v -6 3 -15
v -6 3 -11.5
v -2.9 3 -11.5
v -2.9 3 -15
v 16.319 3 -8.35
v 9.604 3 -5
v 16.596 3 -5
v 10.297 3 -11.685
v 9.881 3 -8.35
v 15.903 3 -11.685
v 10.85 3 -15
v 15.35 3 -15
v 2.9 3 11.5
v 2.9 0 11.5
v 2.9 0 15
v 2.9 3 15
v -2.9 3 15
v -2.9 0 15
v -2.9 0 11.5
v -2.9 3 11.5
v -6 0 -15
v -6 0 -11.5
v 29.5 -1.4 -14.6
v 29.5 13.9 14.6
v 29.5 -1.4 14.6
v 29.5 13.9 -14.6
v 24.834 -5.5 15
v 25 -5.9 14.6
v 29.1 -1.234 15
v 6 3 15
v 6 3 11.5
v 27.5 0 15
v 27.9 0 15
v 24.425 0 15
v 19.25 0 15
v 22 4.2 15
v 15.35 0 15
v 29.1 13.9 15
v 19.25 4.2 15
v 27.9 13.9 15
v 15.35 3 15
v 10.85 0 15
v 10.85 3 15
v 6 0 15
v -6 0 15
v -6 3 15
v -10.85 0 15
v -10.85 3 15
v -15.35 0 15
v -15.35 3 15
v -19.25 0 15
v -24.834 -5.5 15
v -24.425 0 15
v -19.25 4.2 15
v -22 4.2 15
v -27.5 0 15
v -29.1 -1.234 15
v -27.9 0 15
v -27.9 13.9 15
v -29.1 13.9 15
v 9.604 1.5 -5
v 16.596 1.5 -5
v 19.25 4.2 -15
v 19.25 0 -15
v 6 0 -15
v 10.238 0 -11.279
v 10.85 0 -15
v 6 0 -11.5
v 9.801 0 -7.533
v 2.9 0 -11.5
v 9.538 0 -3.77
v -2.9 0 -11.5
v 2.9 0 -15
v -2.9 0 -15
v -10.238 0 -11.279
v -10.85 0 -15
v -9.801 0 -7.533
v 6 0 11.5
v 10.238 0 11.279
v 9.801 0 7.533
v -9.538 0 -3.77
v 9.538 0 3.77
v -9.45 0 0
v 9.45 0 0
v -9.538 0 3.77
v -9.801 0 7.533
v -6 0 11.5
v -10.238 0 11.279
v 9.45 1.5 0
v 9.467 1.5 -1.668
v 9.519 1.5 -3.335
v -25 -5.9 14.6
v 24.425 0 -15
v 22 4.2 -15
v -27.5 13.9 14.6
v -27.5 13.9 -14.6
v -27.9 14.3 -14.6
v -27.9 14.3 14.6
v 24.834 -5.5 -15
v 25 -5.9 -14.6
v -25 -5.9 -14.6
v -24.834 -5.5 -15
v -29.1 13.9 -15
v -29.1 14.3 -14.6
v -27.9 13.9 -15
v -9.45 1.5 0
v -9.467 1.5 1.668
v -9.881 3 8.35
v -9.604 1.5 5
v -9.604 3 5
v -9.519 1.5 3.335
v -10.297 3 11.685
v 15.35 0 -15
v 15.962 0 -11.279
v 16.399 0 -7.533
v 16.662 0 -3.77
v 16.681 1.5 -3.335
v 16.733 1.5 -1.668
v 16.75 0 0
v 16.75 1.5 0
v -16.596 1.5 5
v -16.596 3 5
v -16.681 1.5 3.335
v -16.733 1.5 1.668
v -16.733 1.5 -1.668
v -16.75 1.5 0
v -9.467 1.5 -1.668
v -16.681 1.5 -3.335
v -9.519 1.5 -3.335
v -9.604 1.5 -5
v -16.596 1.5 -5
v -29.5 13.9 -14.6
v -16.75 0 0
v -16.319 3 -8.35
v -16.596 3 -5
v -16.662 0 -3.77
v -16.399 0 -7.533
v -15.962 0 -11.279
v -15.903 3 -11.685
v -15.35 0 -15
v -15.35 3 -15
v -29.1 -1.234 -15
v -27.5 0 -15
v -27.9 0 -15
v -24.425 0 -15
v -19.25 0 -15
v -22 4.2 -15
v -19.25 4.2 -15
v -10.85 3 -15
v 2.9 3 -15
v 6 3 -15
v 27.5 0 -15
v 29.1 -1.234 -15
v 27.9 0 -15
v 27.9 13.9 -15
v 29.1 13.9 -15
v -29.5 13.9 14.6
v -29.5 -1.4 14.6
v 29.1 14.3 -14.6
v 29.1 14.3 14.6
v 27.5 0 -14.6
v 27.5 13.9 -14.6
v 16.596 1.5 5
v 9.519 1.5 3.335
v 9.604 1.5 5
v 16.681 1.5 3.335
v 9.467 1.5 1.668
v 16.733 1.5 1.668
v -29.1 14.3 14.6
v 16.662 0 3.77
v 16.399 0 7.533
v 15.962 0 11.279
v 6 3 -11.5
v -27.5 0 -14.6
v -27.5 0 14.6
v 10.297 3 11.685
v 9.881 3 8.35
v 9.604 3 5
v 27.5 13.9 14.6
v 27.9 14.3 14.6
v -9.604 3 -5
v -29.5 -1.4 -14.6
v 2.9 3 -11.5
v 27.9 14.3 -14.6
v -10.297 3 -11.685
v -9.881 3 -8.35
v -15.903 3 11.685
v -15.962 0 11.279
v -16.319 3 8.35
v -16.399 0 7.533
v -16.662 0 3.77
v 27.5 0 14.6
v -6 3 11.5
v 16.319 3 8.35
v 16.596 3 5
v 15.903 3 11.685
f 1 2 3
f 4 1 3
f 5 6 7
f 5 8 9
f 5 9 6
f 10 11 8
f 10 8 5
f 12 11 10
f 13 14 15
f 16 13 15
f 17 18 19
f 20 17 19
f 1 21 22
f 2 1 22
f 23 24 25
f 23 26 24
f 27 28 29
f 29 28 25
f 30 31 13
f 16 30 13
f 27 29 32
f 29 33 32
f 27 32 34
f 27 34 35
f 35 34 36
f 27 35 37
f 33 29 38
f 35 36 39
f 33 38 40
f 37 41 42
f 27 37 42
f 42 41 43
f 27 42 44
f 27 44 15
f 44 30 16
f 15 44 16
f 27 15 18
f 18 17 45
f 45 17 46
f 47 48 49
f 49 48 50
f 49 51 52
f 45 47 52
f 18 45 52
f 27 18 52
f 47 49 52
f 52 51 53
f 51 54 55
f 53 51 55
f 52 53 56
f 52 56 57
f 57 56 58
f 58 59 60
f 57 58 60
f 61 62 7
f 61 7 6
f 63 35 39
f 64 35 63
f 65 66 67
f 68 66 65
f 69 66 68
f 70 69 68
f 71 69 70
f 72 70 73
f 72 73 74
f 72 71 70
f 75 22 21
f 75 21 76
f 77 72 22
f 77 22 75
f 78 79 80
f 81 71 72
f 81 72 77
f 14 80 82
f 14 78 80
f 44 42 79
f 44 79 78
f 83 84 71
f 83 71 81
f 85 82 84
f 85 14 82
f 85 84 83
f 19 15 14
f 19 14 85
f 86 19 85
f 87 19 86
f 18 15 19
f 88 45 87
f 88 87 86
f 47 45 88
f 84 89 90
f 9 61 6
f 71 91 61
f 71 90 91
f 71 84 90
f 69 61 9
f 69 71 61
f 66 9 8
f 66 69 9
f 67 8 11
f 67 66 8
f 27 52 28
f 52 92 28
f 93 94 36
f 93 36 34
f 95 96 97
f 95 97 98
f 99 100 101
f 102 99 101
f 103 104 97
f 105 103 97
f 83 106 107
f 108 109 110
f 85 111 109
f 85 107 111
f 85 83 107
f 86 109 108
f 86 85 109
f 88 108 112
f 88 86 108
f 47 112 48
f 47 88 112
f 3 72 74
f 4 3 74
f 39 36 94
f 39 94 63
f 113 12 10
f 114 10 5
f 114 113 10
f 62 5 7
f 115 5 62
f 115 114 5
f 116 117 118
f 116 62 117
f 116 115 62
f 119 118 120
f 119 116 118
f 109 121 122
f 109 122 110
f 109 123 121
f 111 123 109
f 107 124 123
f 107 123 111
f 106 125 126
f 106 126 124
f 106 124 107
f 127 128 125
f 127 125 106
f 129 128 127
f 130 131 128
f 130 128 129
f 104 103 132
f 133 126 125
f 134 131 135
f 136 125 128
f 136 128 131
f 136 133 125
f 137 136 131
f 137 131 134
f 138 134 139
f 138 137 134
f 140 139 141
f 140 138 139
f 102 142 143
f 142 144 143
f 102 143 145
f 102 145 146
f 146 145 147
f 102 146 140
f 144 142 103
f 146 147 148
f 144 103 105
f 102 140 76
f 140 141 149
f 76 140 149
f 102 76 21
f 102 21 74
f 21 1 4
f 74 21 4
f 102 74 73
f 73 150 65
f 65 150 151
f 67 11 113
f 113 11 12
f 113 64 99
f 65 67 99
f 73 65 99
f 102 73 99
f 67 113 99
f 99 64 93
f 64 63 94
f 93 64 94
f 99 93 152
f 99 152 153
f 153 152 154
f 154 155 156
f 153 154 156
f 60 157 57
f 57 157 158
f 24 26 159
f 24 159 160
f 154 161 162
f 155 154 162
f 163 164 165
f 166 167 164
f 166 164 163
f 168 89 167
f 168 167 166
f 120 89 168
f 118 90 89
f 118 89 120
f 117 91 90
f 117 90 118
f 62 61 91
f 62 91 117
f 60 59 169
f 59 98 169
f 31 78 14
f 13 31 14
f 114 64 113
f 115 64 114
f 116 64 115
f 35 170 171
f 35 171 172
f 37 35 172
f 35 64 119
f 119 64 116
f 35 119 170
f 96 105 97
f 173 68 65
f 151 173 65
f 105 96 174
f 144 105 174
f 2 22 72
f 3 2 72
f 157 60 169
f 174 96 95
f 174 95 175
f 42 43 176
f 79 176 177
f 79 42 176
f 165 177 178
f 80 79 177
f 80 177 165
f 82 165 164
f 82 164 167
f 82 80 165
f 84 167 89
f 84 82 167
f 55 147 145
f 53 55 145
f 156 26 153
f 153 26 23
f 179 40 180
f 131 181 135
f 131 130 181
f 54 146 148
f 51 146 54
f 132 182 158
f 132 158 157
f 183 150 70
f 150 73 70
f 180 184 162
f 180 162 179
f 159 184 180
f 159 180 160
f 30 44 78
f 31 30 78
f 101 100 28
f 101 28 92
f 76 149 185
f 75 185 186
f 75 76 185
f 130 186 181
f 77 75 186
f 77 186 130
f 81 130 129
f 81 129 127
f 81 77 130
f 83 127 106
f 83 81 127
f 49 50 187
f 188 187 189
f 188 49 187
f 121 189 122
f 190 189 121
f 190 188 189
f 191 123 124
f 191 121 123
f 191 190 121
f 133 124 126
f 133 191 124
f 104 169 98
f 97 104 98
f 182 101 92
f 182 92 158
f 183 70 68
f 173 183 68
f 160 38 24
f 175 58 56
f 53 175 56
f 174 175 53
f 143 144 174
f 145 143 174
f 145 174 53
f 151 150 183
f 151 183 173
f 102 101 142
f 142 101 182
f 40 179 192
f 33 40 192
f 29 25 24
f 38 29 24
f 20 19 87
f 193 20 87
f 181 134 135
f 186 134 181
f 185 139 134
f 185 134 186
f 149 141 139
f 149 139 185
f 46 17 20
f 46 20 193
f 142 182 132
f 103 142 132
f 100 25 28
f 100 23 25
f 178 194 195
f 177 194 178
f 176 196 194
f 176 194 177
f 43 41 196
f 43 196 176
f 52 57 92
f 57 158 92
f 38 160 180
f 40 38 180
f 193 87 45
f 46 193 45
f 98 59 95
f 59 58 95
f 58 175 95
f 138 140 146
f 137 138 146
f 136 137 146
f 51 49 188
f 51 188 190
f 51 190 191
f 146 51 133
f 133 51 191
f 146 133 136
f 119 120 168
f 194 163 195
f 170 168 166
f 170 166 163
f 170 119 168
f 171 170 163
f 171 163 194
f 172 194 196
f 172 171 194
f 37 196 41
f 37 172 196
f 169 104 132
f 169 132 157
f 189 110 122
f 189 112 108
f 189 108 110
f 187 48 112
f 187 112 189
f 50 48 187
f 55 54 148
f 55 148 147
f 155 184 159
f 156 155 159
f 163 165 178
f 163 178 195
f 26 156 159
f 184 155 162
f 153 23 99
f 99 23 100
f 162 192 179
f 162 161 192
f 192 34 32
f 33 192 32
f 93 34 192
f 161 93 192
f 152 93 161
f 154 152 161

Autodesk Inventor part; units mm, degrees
ref_plane "YZ Plane" through (0, 0, 0) normal (1, 0, 0) x (0, 1, 0)
ref_plane "XZ Plane" through (0, 0, 0) normal (0, 1, 0) x (-1, 0, 0)
ref_plane "XY Plane" through (0, 0, 0) normal (0, 0, 1) x (1, 0, 0)
sketch "スケッチ1" plane through (0, 0, 0) normal (0, 1, 0) x (-1, 0, 0)
  line L0 (0, -21.0065) -> (0, 21.0391) projected
  line L1 (-95.27, 0) -> (121.47, 0) projected
  line L2 (22, -15) -> (-22, -15)
  line L3 (-22, -15) -> (-22, 15)
  line L4 (-22, 15) -> (22, 15)
  line L5 (22, 15) -> (22, -15)
  line L6 (6, 15) -> (2.9, 15)
  line L7 (2.9, 15) -> (2.9, 11.5)
  line L8 (2.9, 11.5) -> (6, 11.5)
  line L9 (6, 11.5) -> (6, 15)
  arc A0 (10.85, 15) -> (9.45, 0) centre (90.5071, 0) ccw
  arc A1 (16.75, 0) -> (15.35, 15) centre (-64.3071, 0) ccw
  line L10 (13.1, -2.0457) -> (13.1, 1.915)
  line L11 (16.75, 0) -> (9.45, 0)
  line L12 (15.35, 15) -> (10.85, 15)
  line L13 (16.5956, 5) -> (9.6044, 5)
  line L14 (19.25, -15) -> (19.25, 15)
  point P0 (0, 0)
  point P1 (2.9, 15)
  point P2 (19.25, 0)
  point P3 (22, 0)
  dimension "d0" = 44
  dimension "d1" = 30
  dimension "d18" = 3.5
  dimension "d19" = 6
  dimension "d20" = 3.1
  dimension "d21" = 16.75
  dimension "d22" = 7.3
  dimension "d25" = 4.5
  dimension "d26" = 10
  dimension "d28" = 6.9913
  dimension "d37" = 2.9
  dimension "d38" = 19.25
extrude "押し出し1" add sketch "スケッチ1" against normal blind 2
extrude "押し出し3" add sketch "スケッチ1" along normal blind 3 contours L4 L9 L8 L7 | A0 L4 A1 L13
extrude "押し出し4" add sketch "スケッチ1" along normal blind 1.5 contours A0 L13 A1 L1
mirror "ミラー1" about plane through (0, 0, 0) normal (0, 0, 1) of "押し出し1", "押し出し3", "押し出し4"
extrude "押し出し5" add sketch "スケッチ1" along normal blind 4.2 contours L14 L1 L5 L2 | L14 L4 L5 L1
mirror "ミラー3" about plane through (0, 0, 0) normal (1, 0, 0) of "押し出し1", "押し出し3", "押し出し4", "ミラー1", "押し出し5"
sketch "スケッチ2" plane through (0, 0, 0) normal (0, 0, 1) x (1, 0, 0)
  line L0 (0, 5.44) -> (0, -3.24) projected
  line L1 (-30.8, 0) -> (30.8, 0) projected
  line L2 (-29.5, 14.3) -> (-27.5, 14.3)
  line L3 (-27.5, 14.3) -> (-27.5, 0)
  line L4 (27.5, 0) -> (27.5, 14.3)
  line L5 (27.5, 14.3) -> (29.5, 14.3)
  line L6 (29.5, 14.3) -> (29.5, -1.4)
  line L7 (29.5, -1.4) -> (25, -5.9)
  line L8 (25, -5.9) -> (-25, -5.9)
  line L9 (-25, -5.9) -> (-29.5, -1.4)
  line L10 (-29.5, -1.4) -> (-29.5, 14.3)
  line L11 (-19.25, 4.2) -> (-22, 4.2) projected
  line L12 (19.25, 4.2) -> (22, 4.2) projected
  line L13 (-22, -2) -> (-22, 4.2) projected
  line L14 (-22, 0) -> (-22, 4.2)
  line L15 (-22, 4.2) -> (-24.4249, 0)
  line L16 (22, -2) -> (22, 4.2) projected
  line L17 (22, 0) -> (22, 4.2)
  line L18 (22, 4.2) -> (24.4249, 0)
  line L19 (-27.5, 0) -> (-24.4249, 0)
  line L20 (-22, 0) -> (22, 0)
  line L21 (24.4249, 0) -> (27.5, 0)
  point P0 (0, 0)
  point P1 (24.4249, 0)
  point P2 (22, 0)
  point P3 (-22, 0)
  point P4 (-24.4249, 0)
  dimension "d41" = 59
  dimension "d42" = 2
  dimension "d44" = 20.2
  dimension "d45" = 45
  dimension "d46" = 50
  dimension "d47" = 120
  dimension "d50" = 14.3
extrude "押し出し6" add sketch "スケッチ2" along normal mid plane 30
chamfer "面取り1" distance 0.4 angle 45 22 edges at (-29.5, 6.45, 15) (-28.5, 14.3, 15) (-27.5, 7.15, 15) (-27.25, -3.65, 15) (0, -5.9, 15) (27.25, -3.65, 15) (29.5, 6.45, 15) (28.5, 14.3, 15) (27.5, 7.15, 15) (-29.5, 6.45, -15) (-28.5, 14.3, -15) (-27.5, 7.15, -15) (-27.25, -3.65, -15) (0, -5.9, -15) (27.25, -3.65, -15) (29.5, 6.45, -15) (28.5, 14.3, -15) (27.5, 7.15, -15) (-29.5, 14.3, 0) (-27.5, 14.3, 0) (27.5, 14.3, 0) (29.5, 14.3, 0)
equation "\"d39\" = 0.5 * RailHeight"
equation "\"RailHeight\" = 8.4"
properties part number "PillarTopVD"
